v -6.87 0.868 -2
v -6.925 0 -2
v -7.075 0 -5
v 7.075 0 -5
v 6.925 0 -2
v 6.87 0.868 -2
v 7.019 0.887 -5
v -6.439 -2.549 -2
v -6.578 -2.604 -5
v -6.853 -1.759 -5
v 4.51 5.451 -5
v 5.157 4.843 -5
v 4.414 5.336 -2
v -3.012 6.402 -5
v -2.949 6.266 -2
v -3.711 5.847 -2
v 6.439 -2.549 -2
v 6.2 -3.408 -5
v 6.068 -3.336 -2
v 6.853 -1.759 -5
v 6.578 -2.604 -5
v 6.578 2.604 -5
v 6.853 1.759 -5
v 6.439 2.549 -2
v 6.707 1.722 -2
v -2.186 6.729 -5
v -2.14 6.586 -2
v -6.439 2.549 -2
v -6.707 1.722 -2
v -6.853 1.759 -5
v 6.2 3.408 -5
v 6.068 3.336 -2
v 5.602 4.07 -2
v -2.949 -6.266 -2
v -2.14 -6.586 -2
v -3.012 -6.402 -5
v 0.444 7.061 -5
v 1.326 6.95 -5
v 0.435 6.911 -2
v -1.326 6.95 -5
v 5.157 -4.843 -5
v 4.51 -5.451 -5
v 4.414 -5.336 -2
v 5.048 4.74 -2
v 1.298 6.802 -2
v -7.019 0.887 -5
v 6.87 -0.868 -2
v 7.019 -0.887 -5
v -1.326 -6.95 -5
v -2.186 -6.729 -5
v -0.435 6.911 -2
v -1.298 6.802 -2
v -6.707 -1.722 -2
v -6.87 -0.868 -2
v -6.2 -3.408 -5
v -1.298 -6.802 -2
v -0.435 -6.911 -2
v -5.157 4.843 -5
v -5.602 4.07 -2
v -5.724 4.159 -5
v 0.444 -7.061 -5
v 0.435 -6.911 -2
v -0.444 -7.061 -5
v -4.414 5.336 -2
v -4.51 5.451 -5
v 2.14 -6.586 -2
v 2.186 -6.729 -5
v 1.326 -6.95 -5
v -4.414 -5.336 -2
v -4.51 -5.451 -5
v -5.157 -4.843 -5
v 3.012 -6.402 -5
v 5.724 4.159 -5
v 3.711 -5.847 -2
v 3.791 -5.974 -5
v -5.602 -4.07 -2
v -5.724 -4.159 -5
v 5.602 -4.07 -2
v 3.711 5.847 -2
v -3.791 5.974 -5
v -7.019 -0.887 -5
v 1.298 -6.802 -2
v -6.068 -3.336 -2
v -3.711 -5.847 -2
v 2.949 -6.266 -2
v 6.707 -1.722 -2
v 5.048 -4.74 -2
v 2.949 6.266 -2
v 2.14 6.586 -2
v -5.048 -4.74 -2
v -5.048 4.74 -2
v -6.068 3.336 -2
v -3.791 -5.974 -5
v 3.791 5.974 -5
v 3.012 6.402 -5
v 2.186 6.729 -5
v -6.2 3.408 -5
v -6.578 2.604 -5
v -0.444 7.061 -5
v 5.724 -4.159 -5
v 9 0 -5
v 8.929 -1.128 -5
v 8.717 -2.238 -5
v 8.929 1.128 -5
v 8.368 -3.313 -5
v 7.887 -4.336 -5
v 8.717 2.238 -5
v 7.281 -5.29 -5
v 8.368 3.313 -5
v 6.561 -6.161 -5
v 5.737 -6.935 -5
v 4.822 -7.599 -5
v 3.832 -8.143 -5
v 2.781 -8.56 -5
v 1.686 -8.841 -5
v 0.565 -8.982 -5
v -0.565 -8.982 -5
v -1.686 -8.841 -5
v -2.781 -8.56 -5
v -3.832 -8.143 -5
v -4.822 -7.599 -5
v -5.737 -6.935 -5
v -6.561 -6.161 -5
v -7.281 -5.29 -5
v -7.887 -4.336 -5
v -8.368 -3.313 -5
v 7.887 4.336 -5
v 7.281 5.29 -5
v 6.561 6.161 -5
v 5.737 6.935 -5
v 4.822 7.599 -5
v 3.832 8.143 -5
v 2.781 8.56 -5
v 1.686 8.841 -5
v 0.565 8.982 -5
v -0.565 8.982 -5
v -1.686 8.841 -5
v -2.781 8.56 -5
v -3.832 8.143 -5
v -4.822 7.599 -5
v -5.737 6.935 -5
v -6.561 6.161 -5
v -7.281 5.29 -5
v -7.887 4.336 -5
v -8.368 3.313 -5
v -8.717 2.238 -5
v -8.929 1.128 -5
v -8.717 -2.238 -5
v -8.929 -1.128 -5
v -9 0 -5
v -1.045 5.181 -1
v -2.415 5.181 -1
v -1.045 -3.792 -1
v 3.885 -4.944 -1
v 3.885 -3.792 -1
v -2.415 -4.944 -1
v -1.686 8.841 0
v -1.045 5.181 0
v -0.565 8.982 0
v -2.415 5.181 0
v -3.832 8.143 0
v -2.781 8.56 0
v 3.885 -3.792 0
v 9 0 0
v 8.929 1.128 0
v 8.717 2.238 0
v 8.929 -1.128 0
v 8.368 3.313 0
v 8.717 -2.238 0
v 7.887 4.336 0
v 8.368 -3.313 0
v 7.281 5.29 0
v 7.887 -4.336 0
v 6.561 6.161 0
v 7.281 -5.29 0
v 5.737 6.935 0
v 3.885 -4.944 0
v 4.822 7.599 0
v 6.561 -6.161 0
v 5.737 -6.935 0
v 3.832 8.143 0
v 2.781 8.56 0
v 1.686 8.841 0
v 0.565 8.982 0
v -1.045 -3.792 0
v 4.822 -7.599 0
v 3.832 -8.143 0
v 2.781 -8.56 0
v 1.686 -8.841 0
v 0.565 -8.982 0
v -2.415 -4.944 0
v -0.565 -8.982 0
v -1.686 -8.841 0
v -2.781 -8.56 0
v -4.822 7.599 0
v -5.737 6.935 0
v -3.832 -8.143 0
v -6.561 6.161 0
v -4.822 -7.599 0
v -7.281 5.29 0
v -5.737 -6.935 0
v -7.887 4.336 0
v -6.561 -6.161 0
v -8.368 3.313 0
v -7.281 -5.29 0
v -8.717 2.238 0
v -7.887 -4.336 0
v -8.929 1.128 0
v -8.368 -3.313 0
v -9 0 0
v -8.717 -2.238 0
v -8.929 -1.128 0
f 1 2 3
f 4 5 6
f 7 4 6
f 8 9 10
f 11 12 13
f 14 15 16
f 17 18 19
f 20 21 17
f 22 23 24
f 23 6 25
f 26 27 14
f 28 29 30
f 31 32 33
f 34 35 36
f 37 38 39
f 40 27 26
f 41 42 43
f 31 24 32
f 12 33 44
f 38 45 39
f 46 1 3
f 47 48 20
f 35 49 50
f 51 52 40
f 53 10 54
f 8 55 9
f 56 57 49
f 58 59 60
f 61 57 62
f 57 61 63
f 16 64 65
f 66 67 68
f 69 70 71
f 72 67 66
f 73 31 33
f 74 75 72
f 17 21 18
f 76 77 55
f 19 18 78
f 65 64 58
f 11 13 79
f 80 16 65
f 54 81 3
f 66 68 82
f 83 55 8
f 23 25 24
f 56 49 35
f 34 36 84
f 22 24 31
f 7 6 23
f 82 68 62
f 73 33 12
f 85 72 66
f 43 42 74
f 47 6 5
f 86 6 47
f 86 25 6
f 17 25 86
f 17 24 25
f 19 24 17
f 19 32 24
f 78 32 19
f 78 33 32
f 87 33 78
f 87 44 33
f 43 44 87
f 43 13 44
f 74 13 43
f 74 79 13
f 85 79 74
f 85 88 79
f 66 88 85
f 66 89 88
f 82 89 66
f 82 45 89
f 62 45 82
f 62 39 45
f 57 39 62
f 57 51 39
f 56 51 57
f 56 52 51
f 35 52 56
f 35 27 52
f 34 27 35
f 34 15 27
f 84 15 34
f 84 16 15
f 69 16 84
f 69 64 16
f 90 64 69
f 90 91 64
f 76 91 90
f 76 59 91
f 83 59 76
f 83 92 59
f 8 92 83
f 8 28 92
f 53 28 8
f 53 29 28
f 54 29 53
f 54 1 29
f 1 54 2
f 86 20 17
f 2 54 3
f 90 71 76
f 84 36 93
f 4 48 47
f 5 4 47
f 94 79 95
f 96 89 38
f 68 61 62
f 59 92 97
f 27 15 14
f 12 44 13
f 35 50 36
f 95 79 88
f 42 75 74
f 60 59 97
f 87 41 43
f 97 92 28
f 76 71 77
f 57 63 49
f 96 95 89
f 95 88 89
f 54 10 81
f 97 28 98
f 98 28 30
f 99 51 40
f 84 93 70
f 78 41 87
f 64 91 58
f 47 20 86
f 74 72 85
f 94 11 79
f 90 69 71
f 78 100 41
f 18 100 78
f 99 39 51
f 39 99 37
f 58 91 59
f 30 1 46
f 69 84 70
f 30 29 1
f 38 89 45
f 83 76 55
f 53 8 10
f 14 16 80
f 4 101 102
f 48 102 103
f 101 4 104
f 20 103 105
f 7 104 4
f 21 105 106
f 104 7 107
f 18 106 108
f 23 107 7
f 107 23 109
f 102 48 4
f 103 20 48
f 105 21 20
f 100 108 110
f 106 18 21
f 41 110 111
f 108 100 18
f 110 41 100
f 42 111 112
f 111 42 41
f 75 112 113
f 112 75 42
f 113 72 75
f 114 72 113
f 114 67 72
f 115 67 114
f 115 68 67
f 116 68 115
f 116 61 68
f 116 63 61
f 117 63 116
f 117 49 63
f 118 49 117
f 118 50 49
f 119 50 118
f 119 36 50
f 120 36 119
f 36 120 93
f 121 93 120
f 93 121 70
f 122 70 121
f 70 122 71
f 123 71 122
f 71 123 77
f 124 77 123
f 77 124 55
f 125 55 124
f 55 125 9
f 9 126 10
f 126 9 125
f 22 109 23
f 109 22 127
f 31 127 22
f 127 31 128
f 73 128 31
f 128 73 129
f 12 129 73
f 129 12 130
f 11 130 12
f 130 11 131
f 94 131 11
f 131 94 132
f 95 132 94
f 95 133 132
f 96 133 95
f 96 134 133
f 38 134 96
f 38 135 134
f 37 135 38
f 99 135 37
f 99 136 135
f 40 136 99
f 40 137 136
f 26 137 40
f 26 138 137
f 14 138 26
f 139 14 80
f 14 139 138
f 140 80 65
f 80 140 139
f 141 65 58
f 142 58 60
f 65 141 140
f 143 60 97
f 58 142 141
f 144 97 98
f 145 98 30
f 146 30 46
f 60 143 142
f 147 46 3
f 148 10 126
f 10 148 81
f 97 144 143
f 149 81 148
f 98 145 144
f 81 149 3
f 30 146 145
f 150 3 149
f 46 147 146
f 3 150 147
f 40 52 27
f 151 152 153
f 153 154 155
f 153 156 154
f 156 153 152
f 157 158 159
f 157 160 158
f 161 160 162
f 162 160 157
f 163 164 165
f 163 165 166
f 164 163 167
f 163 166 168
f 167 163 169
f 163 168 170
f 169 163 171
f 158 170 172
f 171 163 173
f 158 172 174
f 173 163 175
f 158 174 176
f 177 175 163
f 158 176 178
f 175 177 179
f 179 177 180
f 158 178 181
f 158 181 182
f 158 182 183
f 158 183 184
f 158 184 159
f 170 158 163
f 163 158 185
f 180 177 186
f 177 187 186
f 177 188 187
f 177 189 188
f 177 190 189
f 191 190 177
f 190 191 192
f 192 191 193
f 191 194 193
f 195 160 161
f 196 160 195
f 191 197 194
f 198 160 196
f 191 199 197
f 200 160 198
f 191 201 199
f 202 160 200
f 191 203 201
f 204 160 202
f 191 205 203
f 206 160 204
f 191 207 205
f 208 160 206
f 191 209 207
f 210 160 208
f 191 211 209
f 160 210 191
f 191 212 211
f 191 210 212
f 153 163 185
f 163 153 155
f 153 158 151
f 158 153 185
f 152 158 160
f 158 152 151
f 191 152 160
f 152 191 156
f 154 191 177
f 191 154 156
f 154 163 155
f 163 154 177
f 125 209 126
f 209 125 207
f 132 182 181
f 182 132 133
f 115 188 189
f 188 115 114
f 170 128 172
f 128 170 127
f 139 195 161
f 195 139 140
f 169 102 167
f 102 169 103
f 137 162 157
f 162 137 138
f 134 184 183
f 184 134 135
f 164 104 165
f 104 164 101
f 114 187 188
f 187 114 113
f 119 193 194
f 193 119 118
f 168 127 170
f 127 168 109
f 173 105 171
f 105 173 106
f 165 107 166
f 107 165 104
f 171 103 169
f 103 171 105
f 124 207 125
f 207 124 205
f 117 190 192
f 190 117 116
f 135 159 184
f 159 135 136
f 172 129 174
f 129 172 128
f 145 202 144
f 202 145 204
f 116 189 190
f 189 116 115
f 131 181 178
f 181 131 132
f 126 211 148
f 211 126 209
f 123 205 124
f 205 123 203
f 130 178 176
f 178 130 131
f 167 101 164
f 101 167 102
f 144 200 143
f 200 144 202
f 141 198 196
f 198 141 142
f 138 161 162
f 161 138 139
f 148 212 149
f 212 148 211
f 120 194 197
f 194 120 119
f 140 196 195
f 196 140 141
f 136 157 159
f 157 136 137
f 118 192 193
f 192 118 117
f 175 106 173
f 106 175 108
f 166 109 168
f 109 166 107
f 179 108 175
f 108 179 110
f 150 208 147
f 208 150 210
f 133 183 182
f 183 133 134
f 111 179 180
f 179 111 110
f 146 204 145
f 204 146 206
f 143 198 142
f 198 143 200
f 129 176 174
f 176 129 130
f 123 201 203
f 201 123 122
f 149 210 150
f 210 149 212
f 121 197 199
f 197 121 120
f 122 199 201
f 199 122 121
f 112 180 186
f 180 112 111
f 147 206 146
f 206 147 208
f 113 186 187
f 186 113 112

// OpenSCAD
$fn = 50;

difference() {
	union() {
		translate(v = [0, 0, -5.0]) {
			cylinder(h = 5, r = 9.0);
		}
	}
	union() {
		#translate(v = [0, 0, -5.0]) {
			cylinder(h = 3, r1 = 7.075, r2 = 6.925);
		}
		translate(v = [0, 0, -1]) {
			linear_extrude(height = 1) {
				text(font = "Impact", halign = "center", size = 10, text = "L", valign = "center");
			}
		}
	}
}
